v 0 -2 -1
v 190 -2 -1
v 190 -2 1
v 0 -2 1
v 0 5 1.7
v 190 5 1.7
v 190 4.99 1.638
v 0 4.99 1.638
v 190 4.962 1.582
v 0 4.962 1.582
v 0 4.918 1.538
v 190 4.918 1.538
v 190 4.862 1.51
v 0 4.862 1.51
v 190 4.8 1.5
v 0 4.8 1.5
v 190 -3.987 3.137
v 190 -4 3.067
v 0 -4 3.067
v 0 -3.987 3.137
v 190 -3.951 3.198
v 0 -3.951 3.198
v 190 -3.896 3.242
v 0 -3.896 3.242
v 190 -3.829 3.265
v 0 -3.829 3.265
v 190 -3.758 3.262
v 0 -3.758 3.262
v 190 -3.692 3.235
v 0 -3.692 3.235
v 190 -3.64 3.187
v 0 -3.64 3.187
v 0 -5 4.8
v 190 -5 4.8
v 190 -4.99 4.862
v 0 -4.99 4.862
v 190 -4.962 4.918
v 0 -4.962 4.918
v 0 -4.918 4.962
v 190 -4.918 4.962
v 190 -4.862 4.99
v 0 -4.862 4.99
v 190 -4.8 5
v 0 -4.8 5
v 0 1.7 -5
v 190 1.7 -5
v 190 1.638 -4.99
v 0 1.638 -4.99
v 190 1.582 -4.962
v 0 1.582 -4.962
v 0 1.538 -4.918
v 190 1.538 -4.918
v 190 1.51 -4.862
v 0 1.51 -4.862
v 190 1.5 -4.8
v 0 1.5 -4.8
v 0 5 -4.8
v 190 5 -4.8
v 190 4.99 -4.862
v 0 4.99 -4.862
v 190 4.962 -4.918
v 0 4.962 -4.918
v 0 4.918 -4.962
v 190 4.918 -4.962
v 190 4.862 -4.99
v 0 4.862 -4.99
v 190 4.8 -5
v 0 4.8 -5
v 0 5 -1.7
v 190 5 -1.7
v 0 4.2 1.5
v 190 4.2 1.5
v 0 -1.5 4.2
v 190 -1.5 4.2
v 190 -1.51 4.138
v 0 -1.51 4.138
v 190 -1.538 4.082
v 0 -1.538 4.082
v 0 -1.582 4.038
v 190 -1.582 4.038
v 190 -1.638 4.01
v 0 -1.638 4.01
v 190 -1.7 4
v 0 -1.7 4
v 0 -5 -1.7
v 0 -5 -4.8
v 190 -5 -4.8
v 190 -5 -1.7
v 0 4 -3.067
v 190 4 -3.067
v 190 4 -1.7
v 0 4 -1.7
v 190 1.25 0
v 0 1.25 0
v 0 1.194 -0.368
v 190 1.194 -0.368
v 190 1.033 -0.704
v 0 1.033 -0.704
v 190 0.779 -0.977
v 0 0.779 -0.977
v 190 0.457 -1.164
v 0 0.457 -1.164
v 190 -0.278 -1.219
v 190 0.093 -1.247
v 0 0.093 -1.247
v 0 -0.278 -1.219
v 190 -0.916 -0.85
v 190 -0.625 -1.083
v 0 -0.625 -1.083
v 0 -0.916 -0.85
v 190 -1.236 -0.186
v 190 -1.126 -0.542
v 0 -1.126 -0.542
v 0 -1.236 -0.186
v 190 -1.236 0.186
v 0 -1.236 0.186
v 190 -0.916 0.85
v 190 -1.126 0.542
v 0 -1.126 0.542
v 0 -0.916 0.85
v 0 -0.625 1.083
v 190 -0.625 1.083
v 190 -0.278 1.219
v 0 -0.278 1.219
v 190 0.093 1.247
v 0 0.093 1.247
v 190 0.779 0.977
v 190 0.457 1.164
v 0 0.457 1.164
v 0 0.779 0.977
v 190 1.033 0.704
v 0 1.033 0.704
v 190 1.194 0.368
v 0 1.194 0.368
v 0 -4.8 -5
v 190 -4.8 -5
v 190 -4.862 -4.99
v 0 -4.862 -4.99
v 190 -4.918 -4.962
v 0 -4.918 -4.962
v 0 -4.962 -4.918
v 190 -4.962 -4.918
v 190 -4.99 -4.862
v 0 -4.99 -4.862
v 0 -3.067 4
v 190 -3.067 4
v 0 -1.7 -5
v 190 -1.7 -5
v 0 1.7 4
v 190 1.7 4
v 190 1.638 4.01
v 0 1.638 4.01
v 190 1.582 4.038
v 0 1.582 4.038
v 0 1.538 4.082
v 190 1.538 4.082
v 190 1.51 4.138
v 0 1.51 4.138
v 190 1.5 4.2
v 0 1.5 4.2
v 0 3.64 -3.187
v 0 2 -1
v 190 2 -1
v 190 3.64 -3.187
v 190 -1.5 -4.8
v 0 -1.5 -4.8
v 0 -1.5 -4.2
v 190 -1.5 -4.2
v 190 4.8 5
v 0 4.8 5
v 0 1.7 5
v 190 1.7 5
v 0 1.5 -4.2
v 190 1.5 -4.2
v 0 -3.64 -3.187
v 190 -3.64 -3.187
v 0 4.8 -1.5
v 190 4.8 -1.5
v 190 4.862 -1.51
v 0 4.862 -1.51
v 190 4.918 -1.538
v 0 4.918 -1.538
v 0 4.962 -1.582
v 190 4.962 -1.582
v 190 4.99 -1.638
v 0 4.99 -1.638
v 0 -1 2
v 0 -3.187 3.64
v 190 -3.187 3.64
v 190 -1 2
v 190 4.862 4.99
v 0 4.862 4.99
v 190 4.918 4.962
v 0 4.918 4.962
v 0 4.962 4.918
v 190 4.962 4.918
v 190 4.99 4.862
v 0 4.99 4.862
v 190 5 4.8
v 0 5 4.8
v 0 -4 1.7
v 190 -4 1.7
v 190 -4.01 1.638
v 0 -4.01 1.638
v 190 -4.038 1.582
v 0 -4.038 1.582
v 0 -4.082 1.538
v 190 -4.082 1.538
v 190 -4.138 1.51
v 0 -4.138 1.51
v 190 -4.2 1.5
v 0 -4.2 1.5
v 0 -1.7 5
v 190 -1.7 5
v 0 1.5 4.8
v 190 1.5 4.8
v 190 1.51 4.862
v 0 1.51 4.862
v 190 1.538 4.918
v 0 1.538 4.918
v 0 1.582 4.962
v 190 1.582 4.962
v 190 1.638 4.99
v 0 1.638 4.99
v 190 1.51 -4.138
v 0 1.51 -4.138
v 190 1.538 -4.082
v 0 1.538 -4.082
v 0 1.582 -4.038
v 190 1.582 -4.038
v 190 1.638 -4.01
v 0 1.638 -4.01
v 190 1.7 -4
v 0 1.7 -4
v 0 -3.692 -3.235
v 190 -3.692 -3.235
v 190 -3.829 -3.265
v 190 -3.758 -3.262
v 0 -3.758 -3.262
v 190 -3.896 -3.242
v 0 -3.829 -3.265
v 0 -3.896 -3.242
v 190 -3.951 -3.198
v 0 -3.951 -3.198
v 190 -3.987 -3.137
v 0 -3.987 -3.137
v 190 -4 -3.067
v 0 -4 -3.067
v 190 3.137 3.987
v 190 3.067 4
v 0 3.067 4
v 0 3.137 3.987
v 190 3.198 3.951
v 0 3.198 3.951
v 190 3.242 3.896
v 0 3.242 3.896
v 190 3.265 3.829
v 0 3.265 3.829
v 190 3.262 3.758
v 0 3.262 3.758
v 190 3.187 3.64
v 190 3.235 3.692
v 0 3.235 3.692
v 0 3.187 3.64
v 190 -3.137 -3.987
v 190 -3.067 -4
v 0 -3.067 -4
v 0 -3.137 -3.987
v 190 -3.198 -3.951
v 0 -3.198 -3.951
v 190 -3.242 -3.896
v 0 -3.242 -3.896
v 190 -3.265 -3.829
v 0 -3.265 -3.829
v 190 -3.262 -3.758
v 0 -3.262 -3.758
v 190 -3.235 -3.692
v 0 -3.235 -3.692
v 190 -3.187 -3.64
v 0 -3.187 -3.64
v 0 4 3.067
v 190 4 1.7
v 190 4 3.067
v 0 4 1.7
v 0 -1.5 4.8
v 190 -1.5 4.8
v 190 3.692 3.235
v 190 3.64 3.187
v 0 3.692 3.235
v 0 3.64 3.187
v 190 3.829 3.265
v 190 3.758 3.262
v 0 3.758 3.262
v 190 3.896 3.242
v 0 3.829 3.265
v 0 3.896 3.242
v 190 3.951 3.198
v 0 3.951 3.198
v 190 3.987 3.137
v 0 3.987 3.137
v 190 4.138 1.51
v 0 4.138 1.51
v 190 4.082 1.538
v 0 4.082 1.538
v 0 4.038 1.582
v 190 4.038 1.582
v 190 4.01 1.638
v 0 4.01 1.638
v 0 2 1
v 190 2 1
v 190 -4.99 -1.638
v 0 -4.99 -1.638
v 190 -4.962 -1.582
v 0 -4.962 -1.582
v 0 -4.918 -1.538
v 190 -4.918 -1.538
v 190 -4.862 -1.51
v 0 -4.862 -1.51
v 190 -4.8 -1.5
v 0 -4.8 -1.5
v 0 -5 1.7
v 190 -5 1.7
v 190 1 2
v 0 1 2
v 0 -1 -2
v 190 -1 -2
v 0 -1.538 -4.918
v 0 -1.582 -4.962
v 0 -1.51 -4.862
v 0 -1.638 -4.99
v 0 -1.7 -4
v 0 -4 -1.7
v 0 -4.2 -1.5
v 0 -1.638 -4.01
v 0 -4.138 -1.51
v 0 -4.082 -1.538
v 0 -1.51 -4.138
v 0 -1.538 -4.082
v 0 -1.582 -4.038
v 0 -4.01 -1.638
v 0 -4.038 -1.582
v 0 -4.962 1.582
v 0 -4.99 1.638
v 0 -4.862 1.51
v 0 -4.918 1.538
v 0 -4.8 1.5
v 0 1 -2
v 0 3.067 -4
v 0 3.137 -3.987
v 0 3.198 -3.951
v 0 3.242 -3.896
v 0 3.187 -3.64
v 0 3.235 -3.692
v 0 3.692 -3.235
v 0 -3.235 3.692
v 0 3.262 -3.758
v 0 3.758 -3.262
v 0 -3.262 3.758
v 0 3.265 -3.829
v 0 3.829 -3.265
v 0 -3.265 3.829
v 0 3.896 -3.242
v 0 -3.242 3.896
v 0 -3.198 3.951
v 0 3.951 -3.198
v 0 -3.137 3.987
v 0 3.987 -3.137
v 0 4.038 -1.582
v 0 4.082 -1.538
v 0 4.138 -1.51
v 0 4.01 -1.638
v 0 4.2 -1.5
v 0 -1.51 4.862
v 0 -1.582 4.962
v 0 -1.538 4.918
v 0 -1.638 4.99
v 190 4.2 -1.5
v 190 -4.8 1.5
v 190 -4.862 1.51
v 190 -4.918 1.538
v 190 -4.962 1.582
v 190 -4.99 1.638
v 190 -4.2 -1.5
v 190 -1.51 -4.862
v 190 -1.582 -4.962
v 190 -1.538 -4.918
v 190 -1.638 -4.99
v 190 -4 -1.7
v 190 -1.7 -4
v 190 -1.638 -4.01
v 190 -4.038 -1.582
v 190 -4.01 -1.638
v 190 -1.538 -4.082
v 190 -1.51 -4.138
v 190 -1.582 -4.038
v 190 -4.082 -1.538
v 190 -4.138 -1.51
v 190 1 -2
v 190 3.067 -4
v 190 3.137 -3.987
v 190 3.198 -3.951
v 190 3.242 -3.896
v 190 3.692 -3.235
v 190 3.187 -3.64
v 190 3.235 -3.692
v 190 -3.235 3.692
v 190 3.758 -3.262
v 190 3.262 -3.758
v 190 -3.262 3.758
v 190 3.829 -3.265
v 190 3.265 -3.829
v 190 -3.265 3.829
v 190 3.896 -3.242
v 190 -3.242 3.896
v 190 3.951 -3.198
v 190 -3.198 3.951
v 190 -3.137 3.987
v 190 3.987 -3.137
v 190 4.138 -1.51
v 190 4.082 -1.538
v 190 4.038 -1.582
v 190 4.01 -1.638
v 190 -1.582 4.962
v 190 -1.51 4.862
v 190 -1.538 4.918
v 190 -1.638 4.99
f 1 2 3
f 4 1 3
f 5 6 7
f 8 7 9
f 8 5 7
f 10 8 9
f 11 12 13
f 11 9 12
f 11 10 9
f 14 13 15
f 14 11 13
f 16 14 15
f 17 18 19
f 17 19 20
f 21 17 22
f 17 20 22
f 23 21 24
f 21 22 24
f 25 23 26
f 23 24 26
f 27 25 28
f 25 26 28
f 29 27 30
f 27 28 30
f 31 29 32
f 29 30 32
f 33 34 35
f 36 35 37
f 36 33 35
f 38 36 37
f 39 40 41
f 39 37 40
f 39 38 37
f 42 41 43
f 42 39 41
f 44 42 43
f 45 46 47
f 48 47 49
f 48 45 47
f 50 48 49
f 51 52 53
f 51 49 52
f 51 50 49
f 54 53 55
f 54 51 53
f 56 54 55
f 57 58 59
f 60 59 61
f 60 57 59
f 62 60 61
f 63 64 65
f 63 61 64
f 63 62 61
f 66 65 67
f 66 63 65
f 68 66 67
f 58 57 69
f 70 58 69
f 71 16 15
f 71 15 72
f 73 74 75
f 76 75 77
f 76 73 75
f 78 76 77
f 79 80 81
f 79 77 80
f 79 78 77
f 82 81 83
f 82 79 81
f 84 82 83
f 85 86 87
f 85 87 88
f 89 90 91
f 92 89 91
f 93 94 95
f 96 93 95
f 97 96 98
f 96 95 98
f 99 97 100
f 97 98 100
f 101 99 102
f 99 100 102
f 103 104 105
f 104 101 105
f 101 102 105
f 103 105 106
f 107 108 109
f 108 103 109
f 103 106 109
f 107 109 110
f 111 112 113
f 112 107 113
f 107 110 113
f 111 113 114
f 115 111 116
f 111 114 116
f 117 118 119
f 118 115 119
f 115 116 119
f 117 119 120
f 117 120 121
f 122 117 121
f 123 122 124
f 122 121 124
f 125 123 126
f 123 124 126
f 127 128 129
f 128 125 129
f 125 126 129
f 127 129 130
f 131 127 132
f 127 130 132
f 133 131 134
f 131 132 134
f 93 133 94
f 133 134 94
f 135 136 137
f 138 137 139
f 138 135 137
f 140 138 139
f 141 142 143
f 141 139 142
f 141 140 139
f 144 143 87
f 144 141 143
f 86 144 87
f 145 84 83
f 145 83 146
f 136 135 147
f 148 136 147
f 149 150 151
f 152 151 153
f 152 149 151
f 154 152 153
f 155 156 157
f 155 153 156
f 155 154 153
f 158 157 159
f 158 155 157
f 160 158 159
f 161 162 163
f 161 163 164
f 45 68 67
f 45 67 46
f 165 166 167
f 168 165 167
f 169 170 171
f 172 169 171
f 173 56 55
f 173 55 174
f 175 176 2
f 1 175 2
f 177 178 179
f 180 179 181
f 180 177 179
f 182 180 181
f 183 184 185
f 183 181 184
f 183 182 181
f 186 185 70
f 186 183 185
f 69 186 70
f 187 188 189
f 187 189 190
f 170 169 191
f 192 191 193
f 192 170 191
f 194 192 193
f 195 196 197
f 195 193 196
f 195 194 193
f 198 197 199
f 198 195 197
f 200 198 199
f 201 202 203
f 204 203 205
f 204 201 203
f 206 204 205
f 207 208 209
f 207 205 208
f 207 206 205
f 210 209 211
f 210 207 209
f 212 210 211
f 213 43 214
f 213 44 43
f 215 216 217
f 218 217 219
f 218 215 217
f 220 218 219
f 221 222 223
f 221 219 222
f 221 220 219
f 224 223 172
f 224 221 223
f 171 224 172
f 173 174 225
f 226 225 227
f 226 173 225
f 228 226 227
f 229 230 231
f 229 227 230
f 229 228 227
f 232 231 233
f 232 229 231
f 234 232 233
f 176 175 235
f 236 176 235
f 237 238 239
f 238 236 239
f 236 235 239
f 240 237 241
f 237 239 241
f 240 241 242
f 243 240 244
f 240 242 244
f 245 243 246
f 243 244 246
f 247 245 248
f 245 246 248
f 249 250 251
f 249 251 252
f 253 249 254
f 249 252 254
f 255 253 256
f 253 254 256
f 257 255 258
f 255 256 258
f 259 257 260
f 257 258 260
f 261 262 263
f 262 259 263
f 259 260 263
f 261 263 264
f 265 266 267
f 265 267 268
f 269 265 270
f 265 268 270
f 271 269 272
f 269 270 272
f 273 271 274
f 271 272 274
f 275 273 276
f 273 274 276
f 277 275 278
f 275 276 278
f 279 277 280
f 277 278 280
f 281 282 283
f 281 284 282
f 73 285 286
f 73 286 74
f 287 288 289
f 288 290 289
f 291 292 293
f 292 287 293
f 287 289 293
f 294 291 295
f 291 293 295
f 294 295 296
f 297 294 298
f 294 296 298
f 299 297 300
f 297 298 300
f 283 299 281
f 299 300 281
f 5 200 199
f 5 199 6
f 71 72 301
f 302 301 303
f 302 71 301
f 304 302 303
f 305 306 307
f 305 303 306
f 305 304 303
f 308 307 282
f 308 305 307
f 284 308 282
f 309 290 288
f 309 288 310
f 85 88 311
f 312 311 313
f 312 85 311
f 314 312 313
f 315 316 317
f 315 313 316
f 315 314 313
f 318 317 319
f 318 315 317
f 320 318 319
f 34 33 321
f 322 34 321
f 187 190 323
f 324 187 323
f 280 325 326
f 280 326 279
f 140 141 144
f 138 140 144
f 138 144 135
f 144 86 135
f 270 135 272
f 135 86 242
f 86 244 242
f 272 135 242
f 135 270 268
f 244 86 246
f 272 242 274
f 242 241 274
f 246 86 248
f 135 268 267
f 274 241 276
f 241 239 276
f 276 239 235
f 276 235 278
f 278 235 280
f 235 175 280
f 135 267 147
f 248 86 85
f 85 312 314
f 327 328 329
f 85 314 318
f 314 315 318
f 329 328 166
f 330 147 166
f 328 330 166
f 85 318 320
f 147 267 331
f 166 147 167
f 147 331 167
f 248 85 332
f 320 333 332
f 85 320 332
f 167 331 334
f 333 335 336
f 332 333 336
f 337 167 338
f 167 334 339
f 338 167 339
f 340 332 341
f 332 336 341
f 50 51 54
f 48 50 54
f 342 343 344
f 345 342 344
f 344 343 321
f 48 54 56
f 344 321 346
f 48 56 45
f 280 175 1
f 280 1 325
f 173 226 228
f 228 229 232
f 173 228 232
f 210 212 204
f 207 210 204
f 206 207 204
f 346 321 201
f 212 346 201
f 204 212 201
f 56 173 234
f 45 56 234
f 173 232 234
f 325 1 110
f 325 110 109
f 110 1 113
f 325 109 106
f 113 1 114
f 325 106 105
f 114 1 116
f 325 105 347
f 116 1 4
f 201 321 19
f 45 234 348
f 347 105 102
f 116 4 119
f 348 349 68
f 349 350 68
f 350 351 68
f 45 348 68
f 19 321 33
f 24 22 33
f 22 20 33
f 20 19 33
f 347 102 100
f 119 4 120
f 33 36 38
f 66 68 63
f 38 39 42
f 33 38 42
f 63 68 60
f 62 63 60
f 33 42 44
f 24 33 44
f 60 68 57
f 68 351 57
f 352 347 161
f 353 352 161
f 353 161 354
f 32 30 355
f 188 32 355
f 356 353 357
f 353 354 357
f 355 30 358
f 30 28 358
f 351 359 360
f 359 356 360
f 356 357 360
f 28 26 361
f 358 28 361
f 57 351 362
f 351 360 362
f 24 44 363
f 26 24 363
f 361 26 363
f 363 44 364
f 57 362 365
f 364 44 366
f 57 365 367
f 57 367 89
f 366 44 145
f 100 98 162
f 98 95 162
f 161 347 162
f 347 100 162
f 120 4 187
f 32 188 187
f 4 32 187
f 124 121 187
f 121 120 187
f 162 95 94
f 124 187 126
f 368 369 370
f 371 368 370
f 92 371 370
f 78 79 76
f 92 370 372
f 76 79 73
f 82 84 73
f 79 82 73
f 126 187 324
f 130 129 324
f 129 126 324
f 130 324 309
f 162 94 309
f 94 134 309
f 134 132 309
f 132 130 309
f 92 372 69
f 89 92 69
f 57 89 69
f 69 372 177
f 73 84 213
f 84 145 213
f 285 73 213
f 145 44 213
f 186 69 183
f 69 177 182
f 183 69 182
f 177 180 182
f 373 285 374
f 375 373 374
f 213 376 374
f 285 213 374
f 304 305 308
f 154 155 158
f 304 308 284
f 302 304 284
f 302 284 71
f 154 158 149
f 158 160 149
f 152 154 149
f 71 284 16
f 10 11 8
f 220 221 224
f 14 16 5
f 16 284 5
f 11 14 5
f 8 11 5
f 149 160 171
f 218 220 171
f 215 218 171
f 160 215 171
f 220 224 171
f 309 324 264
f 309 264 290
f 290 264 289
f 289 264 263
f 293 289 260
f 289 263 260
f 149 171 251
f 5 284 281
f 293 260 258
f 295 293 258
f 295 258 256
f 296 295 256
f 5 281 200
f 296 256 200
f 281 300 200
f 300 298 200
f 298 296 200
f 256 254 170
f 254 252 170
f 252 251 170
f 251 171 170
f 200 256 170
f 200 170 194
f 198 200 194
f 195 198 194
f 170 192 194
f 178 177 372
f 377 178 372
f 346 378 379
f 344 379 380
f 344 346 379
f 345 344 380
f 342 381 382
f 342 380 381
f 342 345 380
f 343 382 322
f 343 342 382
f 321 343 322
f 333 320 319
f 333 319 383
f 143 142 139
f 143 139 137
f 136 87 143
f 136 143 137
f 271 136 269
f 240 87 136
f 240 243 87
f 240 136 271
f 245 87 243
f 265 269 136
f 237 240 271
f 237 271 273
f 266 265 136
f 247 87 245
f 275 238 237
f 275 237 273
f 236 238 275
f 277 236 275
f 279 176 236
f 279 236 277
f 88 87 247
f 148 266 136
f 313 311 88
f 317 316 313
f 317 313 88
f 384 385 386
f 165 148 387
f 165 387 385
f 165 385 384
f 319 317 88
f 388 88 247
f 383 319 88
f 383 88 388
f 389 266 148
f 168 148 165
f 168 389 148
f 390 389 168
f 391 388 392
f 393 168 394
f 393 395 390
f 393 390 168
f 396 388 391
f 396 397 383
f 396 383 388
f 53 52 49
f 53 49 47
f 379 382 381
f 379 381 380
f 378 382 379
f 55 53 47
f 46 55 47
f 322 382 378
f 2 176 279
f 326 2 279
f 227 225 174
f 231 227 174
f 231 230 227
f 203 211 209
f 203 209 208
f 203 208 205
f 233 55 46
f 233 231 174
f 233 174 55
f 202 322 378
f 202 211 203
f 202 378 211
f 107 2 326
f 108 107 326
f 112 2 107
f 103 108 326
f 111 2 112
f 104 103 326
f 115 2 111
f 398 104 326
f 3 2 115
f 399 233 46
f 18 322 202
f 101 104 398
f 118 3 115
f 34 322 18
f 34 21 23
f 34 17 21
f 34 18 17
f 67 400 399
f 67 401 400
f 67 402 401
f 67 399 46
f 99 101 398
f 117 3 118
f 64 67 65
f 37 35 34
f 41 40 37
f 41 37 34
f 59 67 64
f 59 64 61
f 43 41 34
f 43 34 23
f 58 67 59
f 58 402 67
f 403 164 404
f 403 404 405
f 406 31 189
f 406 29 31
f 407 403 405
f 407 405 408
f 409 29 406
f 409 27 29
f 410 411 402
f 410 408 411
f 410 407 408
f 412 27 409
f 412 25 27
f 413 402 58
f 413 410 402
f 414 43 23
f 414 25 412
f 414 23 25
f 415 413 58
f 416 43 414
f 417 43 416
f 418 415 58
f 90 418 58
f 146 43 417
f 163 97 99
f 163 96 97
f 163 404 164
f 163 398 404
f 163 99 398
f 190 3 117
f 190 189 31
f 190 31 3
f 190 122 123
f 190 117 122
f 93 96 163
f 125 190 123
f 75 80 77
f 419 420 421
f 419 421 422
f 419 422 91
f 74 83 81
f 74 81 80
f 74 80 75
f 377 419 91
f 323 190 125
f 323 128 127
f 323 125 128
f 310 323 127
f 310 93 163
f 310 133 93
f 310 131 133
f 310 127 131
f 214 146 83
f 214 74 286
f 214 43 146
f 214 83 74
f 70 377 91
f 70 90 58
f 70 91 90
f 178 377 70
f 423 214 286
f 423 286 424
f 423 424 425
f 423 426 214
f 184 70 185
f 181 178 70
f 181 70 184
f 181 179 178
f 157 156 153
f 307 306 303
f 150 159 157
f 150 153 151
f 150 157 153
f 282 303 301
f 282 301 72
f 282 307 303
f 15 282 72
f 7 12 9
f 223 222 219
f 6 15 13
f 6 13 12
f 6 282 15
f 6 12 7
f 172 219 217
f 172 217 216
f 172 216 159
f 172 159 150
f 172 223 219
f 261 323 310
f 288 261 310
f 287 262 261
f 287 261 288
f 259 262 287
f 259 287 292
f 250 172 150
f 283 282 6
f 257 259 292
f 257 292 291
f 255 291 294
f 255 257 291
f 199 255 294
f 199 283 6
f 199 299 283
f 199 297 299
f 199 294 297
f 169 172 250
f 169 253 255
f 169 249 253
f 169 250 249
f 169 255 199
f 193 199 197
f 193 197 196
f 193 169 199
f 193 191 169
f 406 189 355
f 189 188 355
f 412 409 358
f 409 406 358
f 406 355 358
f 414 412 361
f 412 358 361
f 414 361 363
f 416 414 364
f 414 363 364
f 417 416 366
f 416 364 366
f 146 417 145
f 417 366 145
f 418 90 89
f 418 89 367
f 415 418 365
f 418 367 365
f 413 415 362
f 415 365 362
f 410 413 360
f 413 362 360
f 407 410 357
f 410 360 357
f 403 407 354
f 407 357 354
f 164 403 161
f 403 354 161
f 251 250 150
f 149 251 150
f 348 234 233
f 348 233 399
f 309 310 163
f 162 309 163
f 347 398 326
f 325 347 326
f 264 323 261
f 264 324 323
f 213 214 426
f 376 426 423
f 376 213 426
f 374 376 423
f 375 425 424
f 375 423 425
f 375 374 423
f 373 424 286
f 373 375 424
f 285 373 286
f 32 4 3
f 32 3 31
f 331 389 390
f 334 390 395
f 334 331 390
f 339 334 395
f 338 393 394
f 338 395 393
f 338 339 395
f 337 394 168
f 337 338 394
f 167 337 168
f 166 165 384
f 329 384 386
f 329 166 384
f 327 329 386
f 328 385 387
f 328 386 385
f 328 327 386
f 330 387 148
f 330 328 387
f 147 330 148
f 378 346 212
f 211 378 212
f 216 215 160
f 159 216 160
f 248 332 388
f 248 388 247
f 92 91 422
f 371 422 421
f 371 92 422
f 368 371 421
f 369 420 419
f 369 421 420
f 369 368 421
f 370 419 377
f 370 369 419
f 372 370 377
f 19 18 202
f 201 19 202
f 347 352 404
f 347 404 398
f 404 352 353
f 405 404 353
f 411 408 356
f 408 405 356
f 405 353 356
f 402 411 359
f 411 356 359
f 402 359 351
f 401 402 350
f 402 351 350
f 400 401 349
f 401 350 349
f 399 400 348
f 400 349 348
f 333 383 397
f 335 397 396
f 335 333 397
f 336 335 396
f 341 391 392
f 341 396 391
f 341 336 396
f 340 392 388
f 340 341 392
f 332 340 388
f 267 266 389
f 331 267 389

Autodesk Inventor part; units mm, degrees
ref_plane "YZ Plane" through (0, 0, 0) normal (1, 0, 0) x (0, 1, 0)
ref_plane "XZ Plane" through (0, 0, 0) normal (0, 1, 0) x (-1, 0, 0)
ref_plane "XY Plane" through (0, 0, 0) normal (0, 0, 1) x (1, 0, 0)
sketch "Esquisse1" plane through (0, 0, 0) normal (1, 0, 0) x (0, 1, 0)
  line L0 (-5, -5) -> (5, 5) construction
  line L1 (5, -5) -> (-5, 5) construction
  circle A0 centre (0, 0) radius 1.25
  line L2 (2, 1) -> (2, -1)
  line L3 (-1, 2) -> (1, 2)
  line L4 (-2, -1) -> (-2, 1)
  line L5 (1, -2) -> (-1, -2)
  line L6 (4.8, -5) -> (1.7, -5)
  line L7 (5, -4.8) -> (5, -1.7)
  line L8 (1.5, -4.8) -> (1.5, -4.2)
  line L9 (12.6837, 0) -> (-8.9006, 0) construction
  line L10 (1.5, -4) -> (4, -4) construction
  line L11 (4, -4) -> (4, -1.5) construction
  line L12 (4, -1.5) -> (5, -1.5) construction
  line L13 (5, -5) -> (2, -1) construction
  line L14 (2, -1) -> (4, -3.6667) construction
  line L15 (2, -1) -> (4, -3.6667) construction
  line L16 (4, -3.0667) -> (4, -1.7)
  line L17 (4.8, -1.5) -> (4.2, -1.5)
  line L18 (1, -2) -> (5, -5) construction
  line L19 (1.7, -4) -> (3.0667, -4)
  line L20 (3.1867, -3.64) -> (1, -2)
  line L21 (2, -1) -> (3.64, -3.1867)
  arc A1 (5, -1.7) -> (4.8, -1.5) centre (4.8, -1.7) ccw
  arc A2 (4.2, -1.5) -> (4, -1.7) centre (4.2, -1.7) ccw
  arc A3 (4.8, -5) -> (5, -4.8) centre (4.8, -4.8) ccw
  arc A4 (1.5, -4.8) -> (1.7, -5) centre (1.7, -4.8) ccw
  arc A5 (1.7, -4) -> (1.5, -4.2) centre (1.7, -4.2) ccw
  arc A6 (3.0667, -4) -> (3.1867, -3.64) centre (3.0667, -3.8) ccw
  arc A7 (3.64, -3.1867) -> (4, -3.0667) centre (3.8, -3.0667) ccw
  arc A8 (3.1867, 3.64) -> (3.0667, 4) centre (3.0667, 3.8) ccw
  line L22 (1.5, 4.8) -> (1.5, 4.2)
  line L23 (1.5, 4) -> (1.5, 5) construction
  arc A9 (4, 3.0667) -> (3.64, 3.1867) centre (3.8, 3.0667) ccw
  line L24 (3.0667, 4) -> (1.7, 4)
  arc A10 (1.5, 4.2) -> (1.7, 4) centre (1.7, 4.2) ccw
  line L25 (4, 1.7) -> (4, 3.0667)
  line L26 (4, 4) -> (1.5, 4) construction
  line L27 (1, 2) -> (3.1867, 3.64)
  line L28 (4.8, 1.5) -> (4.2, 1.5)
  line L29 (1, 2) -> (3.6667, 4) construction
  line L30 (1, 2) -> (3.6667, 4) construction
  line L31 (4.8, 5) -> (1.7, 5)
  line L32 (3.64, 3.1867) -> (2, 1)
  line L33 (5, 4.8) -> (5, 1.7)
  line L34 (5, 5) -> (1, 2) construction
  line L35 (2, 1) -> (5, 5) construction
  line L36 (4, 1.5) -> (4, 4) construction
  circle A11 centre (0, 0) radius 1.25
  line L37 (-1, 2) -> (1, 2)
  line L38 (-2, -1) -> (-2, 1)
  line L39 (1, -2) -> (-1, -2)
  line L40 (2, 1) -> (2, -1)
  arc A12 (1.7, 5) -> (1.5, 4.8) centre (1.7, 4.8) ccw
  arc A13 (5, 4.8) -> (4.8, 5) centre (4.8, 4.8) ccw
  arc A14 (4, 1.7) -> (4.2, 1.5) centre (4.2, 1.7) ccw
  arc A15 (4.8, 1.5) -> (5, 1.7) centre (4.8, 1.7) ccw
  arc A16 (-3.64, 3.1867) -> (-4, 3.0667) centre (-3.8, 3.0667) ccw
  line L41 (-4.8, 1.5) -> (-4.2, 1.5)
  line L42 (-4, 1.5) -> (-5, 1.5) construction
  arc A17 (-3.0667, 4) -> (-3.1867, 3.64) centre (-3.0667, 3.8) ccw
  line L43 (-4, 3.0667) -> (-4, 1.7)
  arc A18 (-4.2, 1.5) -> (-4, 1.7) centre (-4.2, 1.7) ccw
  line L44 (-1.7, 4) -> (-3.0667, 4)
  line L45 (-4, 4) -> (-4, 1.5) construction
  line L46 (-2, 1) -> (-3.64, 3.1867)
  line L47 (-1.5, 4.8) -> (-1.5, 4.2)
  line L48 (-2, 1) -> (-4, 3.6667) construction
  line L49 (-2, 1) -> (-4, 3.6667) construction
  line L50 (-5, 4.8) -> (-5, 1.7)
  line L51 (-3.1867, 3.64) -> (-1, 2)
  line L52 (-4.8, 5) -> (-1.7, 5)
  line L53 (-5, 5) -> (-2, 1) construction
  line L54 (-1, 2) -> (-5, 5) construction
  line L55 (-1.5, 4) -> (-4, 4) construction
  circle A19 centre (0, 0) radius 1.25
  line L56 (-2, -1) -> (-2, 1)
  line L57 (1, -2) -> (-1, -2)
  line L58 (2, 1) -> (2, -1)
  line L59 (-1, 2) -> (1, 2)
  arc A20 (-5, 1.7) -> (-4.8, 1.5) centre (-4.8, 1.7) ccw
  arc A21 (-4.8, 5) -> (-5, 4.8) centre (-4.8, 4.8) ccw
  arc A22 (-1.7, 4) -> (-1.5, 4.2) centre (-1.7, 4.2) ccw
  arc A23 (-1.5, 4.8) -> (-1.7, 5) centre (-1.7, 4.8) ccw
  arc A24 (-3.1867, -3.64) -> (-3.0667, -4) centre (-3.0667, -3.8) ccw
  line L60 (-1.5, -4.8) -> (-1.5, -4.2)
  line L61 (-1.5, -4) -> (-1.5, -5) construction
  arc A25 (-4, -3.0667) -> (-3.64, -3.1867) centre (-3.8, -3.0667) ccw
  line L62 (-3.0667, -4) -> (-1.7, -4)
  arc A26 (-1.5, -4.2) -> (-1.7, -4) centre (-1.7, -4.2) ccw
  line L63 (-4, -1.7) -> (-4, -3.0667)
  line L64 (-4, -4) -> (-1.5, -4) construction
  line L65 (-1, -2) -> (-3.1867, -3.64)
  line L66 (-4.8, -1.5) -> (-4.2, -1.5)
  line L67 (-1, -2) -> (-3.6667, -4) construction
  line L68 (-1, -2) -> (-3.6667, -4) construction
  line L69 (-4.8, -5) -> (-1.7, -5)
  line L70 (-3.64, -3.1867) -> (-2, -1)
  line L71 (-5, -4.8) -> (-5, -1.7)
  line L72 (-5, -5) -> (-1, -2) construction
  line L73 (-2, -1) -> (-5, -5) construction
  line L74 (-4, -1.5) -> (-4, -4) construction
  circle A27 centre (0, 0) radius 1.25
  line L75 (1, -2) -> (-1, -2)
  line L76 (2, 1) -> (2, -1)
  line L77 (-1, 2) -> (1, 2)
  line L78 (-2, -1) -> (-2, 1)
  arc A28 (-1.7, -5) -> (-1.5, -4.8) centre (-1.7, -4.8) ccw
  arc A29 (-5, -4.8) -> (-4.8, -5) centre (-4.8, -4.8) ccw
  arc A30 (-4, -1.7) -> (-4.2, -1.5) centre (-4.2, -1.7) ccw
  arc A31 (-4.8, -1.5) -> (-5, -1.7) centre (-4.8, -1.7) ccw
  point P0 (2, 0)
  point P1 (0, 2)
  point P2 (-2, 0)
  point P3 (0, -2)
  point P4 (1.5, -5)
  point P5 (3.6667, -4)
  point P6 (4, 3.6667)
  point P7 (5, 1.5)
  point P8 (0, 2)
  point P9 (-2, 0)
  point P10 (0, -2)
  point P11 (2, 0)
  point P12 (-3.6667, 4)
  point P13 (-1.5, 5)
  point P14 (-2, 0)
  point P15 (0, -2)
  point P16 (2, 0)
  point P17 (0, 2)
  point P18 (-4, -3.6667)
  point P19 (-5, -1.5)
  point P20 (0, -2)
  point P21 (2, 0)
  point P22 (0, 2)
  point P23 (-2, 0)
  dimension "d0" = 10
  dimension "d1" = 10
  dimension "d19" = 2.5
  dimension "d30" = 2
  dimension "d36" = 360
  dimension "d39" = 3.5
  dimension "d40" = 3.5
  dimension "d41" = 1
  dimension "d50" = 0.2
  dimension "d60" = 0.2
  dimension "d61" = 0.2
  dimension "d62" = 0.2
  dimension "d63" = 0.2
  dimension "d64" = 0.2
  dimension "d73" = 0.2
  dimension "d80" = 360
extrude "Extrusion1" add sketch "Esquisse1" along normal blind 190
properties part number "profile190"
